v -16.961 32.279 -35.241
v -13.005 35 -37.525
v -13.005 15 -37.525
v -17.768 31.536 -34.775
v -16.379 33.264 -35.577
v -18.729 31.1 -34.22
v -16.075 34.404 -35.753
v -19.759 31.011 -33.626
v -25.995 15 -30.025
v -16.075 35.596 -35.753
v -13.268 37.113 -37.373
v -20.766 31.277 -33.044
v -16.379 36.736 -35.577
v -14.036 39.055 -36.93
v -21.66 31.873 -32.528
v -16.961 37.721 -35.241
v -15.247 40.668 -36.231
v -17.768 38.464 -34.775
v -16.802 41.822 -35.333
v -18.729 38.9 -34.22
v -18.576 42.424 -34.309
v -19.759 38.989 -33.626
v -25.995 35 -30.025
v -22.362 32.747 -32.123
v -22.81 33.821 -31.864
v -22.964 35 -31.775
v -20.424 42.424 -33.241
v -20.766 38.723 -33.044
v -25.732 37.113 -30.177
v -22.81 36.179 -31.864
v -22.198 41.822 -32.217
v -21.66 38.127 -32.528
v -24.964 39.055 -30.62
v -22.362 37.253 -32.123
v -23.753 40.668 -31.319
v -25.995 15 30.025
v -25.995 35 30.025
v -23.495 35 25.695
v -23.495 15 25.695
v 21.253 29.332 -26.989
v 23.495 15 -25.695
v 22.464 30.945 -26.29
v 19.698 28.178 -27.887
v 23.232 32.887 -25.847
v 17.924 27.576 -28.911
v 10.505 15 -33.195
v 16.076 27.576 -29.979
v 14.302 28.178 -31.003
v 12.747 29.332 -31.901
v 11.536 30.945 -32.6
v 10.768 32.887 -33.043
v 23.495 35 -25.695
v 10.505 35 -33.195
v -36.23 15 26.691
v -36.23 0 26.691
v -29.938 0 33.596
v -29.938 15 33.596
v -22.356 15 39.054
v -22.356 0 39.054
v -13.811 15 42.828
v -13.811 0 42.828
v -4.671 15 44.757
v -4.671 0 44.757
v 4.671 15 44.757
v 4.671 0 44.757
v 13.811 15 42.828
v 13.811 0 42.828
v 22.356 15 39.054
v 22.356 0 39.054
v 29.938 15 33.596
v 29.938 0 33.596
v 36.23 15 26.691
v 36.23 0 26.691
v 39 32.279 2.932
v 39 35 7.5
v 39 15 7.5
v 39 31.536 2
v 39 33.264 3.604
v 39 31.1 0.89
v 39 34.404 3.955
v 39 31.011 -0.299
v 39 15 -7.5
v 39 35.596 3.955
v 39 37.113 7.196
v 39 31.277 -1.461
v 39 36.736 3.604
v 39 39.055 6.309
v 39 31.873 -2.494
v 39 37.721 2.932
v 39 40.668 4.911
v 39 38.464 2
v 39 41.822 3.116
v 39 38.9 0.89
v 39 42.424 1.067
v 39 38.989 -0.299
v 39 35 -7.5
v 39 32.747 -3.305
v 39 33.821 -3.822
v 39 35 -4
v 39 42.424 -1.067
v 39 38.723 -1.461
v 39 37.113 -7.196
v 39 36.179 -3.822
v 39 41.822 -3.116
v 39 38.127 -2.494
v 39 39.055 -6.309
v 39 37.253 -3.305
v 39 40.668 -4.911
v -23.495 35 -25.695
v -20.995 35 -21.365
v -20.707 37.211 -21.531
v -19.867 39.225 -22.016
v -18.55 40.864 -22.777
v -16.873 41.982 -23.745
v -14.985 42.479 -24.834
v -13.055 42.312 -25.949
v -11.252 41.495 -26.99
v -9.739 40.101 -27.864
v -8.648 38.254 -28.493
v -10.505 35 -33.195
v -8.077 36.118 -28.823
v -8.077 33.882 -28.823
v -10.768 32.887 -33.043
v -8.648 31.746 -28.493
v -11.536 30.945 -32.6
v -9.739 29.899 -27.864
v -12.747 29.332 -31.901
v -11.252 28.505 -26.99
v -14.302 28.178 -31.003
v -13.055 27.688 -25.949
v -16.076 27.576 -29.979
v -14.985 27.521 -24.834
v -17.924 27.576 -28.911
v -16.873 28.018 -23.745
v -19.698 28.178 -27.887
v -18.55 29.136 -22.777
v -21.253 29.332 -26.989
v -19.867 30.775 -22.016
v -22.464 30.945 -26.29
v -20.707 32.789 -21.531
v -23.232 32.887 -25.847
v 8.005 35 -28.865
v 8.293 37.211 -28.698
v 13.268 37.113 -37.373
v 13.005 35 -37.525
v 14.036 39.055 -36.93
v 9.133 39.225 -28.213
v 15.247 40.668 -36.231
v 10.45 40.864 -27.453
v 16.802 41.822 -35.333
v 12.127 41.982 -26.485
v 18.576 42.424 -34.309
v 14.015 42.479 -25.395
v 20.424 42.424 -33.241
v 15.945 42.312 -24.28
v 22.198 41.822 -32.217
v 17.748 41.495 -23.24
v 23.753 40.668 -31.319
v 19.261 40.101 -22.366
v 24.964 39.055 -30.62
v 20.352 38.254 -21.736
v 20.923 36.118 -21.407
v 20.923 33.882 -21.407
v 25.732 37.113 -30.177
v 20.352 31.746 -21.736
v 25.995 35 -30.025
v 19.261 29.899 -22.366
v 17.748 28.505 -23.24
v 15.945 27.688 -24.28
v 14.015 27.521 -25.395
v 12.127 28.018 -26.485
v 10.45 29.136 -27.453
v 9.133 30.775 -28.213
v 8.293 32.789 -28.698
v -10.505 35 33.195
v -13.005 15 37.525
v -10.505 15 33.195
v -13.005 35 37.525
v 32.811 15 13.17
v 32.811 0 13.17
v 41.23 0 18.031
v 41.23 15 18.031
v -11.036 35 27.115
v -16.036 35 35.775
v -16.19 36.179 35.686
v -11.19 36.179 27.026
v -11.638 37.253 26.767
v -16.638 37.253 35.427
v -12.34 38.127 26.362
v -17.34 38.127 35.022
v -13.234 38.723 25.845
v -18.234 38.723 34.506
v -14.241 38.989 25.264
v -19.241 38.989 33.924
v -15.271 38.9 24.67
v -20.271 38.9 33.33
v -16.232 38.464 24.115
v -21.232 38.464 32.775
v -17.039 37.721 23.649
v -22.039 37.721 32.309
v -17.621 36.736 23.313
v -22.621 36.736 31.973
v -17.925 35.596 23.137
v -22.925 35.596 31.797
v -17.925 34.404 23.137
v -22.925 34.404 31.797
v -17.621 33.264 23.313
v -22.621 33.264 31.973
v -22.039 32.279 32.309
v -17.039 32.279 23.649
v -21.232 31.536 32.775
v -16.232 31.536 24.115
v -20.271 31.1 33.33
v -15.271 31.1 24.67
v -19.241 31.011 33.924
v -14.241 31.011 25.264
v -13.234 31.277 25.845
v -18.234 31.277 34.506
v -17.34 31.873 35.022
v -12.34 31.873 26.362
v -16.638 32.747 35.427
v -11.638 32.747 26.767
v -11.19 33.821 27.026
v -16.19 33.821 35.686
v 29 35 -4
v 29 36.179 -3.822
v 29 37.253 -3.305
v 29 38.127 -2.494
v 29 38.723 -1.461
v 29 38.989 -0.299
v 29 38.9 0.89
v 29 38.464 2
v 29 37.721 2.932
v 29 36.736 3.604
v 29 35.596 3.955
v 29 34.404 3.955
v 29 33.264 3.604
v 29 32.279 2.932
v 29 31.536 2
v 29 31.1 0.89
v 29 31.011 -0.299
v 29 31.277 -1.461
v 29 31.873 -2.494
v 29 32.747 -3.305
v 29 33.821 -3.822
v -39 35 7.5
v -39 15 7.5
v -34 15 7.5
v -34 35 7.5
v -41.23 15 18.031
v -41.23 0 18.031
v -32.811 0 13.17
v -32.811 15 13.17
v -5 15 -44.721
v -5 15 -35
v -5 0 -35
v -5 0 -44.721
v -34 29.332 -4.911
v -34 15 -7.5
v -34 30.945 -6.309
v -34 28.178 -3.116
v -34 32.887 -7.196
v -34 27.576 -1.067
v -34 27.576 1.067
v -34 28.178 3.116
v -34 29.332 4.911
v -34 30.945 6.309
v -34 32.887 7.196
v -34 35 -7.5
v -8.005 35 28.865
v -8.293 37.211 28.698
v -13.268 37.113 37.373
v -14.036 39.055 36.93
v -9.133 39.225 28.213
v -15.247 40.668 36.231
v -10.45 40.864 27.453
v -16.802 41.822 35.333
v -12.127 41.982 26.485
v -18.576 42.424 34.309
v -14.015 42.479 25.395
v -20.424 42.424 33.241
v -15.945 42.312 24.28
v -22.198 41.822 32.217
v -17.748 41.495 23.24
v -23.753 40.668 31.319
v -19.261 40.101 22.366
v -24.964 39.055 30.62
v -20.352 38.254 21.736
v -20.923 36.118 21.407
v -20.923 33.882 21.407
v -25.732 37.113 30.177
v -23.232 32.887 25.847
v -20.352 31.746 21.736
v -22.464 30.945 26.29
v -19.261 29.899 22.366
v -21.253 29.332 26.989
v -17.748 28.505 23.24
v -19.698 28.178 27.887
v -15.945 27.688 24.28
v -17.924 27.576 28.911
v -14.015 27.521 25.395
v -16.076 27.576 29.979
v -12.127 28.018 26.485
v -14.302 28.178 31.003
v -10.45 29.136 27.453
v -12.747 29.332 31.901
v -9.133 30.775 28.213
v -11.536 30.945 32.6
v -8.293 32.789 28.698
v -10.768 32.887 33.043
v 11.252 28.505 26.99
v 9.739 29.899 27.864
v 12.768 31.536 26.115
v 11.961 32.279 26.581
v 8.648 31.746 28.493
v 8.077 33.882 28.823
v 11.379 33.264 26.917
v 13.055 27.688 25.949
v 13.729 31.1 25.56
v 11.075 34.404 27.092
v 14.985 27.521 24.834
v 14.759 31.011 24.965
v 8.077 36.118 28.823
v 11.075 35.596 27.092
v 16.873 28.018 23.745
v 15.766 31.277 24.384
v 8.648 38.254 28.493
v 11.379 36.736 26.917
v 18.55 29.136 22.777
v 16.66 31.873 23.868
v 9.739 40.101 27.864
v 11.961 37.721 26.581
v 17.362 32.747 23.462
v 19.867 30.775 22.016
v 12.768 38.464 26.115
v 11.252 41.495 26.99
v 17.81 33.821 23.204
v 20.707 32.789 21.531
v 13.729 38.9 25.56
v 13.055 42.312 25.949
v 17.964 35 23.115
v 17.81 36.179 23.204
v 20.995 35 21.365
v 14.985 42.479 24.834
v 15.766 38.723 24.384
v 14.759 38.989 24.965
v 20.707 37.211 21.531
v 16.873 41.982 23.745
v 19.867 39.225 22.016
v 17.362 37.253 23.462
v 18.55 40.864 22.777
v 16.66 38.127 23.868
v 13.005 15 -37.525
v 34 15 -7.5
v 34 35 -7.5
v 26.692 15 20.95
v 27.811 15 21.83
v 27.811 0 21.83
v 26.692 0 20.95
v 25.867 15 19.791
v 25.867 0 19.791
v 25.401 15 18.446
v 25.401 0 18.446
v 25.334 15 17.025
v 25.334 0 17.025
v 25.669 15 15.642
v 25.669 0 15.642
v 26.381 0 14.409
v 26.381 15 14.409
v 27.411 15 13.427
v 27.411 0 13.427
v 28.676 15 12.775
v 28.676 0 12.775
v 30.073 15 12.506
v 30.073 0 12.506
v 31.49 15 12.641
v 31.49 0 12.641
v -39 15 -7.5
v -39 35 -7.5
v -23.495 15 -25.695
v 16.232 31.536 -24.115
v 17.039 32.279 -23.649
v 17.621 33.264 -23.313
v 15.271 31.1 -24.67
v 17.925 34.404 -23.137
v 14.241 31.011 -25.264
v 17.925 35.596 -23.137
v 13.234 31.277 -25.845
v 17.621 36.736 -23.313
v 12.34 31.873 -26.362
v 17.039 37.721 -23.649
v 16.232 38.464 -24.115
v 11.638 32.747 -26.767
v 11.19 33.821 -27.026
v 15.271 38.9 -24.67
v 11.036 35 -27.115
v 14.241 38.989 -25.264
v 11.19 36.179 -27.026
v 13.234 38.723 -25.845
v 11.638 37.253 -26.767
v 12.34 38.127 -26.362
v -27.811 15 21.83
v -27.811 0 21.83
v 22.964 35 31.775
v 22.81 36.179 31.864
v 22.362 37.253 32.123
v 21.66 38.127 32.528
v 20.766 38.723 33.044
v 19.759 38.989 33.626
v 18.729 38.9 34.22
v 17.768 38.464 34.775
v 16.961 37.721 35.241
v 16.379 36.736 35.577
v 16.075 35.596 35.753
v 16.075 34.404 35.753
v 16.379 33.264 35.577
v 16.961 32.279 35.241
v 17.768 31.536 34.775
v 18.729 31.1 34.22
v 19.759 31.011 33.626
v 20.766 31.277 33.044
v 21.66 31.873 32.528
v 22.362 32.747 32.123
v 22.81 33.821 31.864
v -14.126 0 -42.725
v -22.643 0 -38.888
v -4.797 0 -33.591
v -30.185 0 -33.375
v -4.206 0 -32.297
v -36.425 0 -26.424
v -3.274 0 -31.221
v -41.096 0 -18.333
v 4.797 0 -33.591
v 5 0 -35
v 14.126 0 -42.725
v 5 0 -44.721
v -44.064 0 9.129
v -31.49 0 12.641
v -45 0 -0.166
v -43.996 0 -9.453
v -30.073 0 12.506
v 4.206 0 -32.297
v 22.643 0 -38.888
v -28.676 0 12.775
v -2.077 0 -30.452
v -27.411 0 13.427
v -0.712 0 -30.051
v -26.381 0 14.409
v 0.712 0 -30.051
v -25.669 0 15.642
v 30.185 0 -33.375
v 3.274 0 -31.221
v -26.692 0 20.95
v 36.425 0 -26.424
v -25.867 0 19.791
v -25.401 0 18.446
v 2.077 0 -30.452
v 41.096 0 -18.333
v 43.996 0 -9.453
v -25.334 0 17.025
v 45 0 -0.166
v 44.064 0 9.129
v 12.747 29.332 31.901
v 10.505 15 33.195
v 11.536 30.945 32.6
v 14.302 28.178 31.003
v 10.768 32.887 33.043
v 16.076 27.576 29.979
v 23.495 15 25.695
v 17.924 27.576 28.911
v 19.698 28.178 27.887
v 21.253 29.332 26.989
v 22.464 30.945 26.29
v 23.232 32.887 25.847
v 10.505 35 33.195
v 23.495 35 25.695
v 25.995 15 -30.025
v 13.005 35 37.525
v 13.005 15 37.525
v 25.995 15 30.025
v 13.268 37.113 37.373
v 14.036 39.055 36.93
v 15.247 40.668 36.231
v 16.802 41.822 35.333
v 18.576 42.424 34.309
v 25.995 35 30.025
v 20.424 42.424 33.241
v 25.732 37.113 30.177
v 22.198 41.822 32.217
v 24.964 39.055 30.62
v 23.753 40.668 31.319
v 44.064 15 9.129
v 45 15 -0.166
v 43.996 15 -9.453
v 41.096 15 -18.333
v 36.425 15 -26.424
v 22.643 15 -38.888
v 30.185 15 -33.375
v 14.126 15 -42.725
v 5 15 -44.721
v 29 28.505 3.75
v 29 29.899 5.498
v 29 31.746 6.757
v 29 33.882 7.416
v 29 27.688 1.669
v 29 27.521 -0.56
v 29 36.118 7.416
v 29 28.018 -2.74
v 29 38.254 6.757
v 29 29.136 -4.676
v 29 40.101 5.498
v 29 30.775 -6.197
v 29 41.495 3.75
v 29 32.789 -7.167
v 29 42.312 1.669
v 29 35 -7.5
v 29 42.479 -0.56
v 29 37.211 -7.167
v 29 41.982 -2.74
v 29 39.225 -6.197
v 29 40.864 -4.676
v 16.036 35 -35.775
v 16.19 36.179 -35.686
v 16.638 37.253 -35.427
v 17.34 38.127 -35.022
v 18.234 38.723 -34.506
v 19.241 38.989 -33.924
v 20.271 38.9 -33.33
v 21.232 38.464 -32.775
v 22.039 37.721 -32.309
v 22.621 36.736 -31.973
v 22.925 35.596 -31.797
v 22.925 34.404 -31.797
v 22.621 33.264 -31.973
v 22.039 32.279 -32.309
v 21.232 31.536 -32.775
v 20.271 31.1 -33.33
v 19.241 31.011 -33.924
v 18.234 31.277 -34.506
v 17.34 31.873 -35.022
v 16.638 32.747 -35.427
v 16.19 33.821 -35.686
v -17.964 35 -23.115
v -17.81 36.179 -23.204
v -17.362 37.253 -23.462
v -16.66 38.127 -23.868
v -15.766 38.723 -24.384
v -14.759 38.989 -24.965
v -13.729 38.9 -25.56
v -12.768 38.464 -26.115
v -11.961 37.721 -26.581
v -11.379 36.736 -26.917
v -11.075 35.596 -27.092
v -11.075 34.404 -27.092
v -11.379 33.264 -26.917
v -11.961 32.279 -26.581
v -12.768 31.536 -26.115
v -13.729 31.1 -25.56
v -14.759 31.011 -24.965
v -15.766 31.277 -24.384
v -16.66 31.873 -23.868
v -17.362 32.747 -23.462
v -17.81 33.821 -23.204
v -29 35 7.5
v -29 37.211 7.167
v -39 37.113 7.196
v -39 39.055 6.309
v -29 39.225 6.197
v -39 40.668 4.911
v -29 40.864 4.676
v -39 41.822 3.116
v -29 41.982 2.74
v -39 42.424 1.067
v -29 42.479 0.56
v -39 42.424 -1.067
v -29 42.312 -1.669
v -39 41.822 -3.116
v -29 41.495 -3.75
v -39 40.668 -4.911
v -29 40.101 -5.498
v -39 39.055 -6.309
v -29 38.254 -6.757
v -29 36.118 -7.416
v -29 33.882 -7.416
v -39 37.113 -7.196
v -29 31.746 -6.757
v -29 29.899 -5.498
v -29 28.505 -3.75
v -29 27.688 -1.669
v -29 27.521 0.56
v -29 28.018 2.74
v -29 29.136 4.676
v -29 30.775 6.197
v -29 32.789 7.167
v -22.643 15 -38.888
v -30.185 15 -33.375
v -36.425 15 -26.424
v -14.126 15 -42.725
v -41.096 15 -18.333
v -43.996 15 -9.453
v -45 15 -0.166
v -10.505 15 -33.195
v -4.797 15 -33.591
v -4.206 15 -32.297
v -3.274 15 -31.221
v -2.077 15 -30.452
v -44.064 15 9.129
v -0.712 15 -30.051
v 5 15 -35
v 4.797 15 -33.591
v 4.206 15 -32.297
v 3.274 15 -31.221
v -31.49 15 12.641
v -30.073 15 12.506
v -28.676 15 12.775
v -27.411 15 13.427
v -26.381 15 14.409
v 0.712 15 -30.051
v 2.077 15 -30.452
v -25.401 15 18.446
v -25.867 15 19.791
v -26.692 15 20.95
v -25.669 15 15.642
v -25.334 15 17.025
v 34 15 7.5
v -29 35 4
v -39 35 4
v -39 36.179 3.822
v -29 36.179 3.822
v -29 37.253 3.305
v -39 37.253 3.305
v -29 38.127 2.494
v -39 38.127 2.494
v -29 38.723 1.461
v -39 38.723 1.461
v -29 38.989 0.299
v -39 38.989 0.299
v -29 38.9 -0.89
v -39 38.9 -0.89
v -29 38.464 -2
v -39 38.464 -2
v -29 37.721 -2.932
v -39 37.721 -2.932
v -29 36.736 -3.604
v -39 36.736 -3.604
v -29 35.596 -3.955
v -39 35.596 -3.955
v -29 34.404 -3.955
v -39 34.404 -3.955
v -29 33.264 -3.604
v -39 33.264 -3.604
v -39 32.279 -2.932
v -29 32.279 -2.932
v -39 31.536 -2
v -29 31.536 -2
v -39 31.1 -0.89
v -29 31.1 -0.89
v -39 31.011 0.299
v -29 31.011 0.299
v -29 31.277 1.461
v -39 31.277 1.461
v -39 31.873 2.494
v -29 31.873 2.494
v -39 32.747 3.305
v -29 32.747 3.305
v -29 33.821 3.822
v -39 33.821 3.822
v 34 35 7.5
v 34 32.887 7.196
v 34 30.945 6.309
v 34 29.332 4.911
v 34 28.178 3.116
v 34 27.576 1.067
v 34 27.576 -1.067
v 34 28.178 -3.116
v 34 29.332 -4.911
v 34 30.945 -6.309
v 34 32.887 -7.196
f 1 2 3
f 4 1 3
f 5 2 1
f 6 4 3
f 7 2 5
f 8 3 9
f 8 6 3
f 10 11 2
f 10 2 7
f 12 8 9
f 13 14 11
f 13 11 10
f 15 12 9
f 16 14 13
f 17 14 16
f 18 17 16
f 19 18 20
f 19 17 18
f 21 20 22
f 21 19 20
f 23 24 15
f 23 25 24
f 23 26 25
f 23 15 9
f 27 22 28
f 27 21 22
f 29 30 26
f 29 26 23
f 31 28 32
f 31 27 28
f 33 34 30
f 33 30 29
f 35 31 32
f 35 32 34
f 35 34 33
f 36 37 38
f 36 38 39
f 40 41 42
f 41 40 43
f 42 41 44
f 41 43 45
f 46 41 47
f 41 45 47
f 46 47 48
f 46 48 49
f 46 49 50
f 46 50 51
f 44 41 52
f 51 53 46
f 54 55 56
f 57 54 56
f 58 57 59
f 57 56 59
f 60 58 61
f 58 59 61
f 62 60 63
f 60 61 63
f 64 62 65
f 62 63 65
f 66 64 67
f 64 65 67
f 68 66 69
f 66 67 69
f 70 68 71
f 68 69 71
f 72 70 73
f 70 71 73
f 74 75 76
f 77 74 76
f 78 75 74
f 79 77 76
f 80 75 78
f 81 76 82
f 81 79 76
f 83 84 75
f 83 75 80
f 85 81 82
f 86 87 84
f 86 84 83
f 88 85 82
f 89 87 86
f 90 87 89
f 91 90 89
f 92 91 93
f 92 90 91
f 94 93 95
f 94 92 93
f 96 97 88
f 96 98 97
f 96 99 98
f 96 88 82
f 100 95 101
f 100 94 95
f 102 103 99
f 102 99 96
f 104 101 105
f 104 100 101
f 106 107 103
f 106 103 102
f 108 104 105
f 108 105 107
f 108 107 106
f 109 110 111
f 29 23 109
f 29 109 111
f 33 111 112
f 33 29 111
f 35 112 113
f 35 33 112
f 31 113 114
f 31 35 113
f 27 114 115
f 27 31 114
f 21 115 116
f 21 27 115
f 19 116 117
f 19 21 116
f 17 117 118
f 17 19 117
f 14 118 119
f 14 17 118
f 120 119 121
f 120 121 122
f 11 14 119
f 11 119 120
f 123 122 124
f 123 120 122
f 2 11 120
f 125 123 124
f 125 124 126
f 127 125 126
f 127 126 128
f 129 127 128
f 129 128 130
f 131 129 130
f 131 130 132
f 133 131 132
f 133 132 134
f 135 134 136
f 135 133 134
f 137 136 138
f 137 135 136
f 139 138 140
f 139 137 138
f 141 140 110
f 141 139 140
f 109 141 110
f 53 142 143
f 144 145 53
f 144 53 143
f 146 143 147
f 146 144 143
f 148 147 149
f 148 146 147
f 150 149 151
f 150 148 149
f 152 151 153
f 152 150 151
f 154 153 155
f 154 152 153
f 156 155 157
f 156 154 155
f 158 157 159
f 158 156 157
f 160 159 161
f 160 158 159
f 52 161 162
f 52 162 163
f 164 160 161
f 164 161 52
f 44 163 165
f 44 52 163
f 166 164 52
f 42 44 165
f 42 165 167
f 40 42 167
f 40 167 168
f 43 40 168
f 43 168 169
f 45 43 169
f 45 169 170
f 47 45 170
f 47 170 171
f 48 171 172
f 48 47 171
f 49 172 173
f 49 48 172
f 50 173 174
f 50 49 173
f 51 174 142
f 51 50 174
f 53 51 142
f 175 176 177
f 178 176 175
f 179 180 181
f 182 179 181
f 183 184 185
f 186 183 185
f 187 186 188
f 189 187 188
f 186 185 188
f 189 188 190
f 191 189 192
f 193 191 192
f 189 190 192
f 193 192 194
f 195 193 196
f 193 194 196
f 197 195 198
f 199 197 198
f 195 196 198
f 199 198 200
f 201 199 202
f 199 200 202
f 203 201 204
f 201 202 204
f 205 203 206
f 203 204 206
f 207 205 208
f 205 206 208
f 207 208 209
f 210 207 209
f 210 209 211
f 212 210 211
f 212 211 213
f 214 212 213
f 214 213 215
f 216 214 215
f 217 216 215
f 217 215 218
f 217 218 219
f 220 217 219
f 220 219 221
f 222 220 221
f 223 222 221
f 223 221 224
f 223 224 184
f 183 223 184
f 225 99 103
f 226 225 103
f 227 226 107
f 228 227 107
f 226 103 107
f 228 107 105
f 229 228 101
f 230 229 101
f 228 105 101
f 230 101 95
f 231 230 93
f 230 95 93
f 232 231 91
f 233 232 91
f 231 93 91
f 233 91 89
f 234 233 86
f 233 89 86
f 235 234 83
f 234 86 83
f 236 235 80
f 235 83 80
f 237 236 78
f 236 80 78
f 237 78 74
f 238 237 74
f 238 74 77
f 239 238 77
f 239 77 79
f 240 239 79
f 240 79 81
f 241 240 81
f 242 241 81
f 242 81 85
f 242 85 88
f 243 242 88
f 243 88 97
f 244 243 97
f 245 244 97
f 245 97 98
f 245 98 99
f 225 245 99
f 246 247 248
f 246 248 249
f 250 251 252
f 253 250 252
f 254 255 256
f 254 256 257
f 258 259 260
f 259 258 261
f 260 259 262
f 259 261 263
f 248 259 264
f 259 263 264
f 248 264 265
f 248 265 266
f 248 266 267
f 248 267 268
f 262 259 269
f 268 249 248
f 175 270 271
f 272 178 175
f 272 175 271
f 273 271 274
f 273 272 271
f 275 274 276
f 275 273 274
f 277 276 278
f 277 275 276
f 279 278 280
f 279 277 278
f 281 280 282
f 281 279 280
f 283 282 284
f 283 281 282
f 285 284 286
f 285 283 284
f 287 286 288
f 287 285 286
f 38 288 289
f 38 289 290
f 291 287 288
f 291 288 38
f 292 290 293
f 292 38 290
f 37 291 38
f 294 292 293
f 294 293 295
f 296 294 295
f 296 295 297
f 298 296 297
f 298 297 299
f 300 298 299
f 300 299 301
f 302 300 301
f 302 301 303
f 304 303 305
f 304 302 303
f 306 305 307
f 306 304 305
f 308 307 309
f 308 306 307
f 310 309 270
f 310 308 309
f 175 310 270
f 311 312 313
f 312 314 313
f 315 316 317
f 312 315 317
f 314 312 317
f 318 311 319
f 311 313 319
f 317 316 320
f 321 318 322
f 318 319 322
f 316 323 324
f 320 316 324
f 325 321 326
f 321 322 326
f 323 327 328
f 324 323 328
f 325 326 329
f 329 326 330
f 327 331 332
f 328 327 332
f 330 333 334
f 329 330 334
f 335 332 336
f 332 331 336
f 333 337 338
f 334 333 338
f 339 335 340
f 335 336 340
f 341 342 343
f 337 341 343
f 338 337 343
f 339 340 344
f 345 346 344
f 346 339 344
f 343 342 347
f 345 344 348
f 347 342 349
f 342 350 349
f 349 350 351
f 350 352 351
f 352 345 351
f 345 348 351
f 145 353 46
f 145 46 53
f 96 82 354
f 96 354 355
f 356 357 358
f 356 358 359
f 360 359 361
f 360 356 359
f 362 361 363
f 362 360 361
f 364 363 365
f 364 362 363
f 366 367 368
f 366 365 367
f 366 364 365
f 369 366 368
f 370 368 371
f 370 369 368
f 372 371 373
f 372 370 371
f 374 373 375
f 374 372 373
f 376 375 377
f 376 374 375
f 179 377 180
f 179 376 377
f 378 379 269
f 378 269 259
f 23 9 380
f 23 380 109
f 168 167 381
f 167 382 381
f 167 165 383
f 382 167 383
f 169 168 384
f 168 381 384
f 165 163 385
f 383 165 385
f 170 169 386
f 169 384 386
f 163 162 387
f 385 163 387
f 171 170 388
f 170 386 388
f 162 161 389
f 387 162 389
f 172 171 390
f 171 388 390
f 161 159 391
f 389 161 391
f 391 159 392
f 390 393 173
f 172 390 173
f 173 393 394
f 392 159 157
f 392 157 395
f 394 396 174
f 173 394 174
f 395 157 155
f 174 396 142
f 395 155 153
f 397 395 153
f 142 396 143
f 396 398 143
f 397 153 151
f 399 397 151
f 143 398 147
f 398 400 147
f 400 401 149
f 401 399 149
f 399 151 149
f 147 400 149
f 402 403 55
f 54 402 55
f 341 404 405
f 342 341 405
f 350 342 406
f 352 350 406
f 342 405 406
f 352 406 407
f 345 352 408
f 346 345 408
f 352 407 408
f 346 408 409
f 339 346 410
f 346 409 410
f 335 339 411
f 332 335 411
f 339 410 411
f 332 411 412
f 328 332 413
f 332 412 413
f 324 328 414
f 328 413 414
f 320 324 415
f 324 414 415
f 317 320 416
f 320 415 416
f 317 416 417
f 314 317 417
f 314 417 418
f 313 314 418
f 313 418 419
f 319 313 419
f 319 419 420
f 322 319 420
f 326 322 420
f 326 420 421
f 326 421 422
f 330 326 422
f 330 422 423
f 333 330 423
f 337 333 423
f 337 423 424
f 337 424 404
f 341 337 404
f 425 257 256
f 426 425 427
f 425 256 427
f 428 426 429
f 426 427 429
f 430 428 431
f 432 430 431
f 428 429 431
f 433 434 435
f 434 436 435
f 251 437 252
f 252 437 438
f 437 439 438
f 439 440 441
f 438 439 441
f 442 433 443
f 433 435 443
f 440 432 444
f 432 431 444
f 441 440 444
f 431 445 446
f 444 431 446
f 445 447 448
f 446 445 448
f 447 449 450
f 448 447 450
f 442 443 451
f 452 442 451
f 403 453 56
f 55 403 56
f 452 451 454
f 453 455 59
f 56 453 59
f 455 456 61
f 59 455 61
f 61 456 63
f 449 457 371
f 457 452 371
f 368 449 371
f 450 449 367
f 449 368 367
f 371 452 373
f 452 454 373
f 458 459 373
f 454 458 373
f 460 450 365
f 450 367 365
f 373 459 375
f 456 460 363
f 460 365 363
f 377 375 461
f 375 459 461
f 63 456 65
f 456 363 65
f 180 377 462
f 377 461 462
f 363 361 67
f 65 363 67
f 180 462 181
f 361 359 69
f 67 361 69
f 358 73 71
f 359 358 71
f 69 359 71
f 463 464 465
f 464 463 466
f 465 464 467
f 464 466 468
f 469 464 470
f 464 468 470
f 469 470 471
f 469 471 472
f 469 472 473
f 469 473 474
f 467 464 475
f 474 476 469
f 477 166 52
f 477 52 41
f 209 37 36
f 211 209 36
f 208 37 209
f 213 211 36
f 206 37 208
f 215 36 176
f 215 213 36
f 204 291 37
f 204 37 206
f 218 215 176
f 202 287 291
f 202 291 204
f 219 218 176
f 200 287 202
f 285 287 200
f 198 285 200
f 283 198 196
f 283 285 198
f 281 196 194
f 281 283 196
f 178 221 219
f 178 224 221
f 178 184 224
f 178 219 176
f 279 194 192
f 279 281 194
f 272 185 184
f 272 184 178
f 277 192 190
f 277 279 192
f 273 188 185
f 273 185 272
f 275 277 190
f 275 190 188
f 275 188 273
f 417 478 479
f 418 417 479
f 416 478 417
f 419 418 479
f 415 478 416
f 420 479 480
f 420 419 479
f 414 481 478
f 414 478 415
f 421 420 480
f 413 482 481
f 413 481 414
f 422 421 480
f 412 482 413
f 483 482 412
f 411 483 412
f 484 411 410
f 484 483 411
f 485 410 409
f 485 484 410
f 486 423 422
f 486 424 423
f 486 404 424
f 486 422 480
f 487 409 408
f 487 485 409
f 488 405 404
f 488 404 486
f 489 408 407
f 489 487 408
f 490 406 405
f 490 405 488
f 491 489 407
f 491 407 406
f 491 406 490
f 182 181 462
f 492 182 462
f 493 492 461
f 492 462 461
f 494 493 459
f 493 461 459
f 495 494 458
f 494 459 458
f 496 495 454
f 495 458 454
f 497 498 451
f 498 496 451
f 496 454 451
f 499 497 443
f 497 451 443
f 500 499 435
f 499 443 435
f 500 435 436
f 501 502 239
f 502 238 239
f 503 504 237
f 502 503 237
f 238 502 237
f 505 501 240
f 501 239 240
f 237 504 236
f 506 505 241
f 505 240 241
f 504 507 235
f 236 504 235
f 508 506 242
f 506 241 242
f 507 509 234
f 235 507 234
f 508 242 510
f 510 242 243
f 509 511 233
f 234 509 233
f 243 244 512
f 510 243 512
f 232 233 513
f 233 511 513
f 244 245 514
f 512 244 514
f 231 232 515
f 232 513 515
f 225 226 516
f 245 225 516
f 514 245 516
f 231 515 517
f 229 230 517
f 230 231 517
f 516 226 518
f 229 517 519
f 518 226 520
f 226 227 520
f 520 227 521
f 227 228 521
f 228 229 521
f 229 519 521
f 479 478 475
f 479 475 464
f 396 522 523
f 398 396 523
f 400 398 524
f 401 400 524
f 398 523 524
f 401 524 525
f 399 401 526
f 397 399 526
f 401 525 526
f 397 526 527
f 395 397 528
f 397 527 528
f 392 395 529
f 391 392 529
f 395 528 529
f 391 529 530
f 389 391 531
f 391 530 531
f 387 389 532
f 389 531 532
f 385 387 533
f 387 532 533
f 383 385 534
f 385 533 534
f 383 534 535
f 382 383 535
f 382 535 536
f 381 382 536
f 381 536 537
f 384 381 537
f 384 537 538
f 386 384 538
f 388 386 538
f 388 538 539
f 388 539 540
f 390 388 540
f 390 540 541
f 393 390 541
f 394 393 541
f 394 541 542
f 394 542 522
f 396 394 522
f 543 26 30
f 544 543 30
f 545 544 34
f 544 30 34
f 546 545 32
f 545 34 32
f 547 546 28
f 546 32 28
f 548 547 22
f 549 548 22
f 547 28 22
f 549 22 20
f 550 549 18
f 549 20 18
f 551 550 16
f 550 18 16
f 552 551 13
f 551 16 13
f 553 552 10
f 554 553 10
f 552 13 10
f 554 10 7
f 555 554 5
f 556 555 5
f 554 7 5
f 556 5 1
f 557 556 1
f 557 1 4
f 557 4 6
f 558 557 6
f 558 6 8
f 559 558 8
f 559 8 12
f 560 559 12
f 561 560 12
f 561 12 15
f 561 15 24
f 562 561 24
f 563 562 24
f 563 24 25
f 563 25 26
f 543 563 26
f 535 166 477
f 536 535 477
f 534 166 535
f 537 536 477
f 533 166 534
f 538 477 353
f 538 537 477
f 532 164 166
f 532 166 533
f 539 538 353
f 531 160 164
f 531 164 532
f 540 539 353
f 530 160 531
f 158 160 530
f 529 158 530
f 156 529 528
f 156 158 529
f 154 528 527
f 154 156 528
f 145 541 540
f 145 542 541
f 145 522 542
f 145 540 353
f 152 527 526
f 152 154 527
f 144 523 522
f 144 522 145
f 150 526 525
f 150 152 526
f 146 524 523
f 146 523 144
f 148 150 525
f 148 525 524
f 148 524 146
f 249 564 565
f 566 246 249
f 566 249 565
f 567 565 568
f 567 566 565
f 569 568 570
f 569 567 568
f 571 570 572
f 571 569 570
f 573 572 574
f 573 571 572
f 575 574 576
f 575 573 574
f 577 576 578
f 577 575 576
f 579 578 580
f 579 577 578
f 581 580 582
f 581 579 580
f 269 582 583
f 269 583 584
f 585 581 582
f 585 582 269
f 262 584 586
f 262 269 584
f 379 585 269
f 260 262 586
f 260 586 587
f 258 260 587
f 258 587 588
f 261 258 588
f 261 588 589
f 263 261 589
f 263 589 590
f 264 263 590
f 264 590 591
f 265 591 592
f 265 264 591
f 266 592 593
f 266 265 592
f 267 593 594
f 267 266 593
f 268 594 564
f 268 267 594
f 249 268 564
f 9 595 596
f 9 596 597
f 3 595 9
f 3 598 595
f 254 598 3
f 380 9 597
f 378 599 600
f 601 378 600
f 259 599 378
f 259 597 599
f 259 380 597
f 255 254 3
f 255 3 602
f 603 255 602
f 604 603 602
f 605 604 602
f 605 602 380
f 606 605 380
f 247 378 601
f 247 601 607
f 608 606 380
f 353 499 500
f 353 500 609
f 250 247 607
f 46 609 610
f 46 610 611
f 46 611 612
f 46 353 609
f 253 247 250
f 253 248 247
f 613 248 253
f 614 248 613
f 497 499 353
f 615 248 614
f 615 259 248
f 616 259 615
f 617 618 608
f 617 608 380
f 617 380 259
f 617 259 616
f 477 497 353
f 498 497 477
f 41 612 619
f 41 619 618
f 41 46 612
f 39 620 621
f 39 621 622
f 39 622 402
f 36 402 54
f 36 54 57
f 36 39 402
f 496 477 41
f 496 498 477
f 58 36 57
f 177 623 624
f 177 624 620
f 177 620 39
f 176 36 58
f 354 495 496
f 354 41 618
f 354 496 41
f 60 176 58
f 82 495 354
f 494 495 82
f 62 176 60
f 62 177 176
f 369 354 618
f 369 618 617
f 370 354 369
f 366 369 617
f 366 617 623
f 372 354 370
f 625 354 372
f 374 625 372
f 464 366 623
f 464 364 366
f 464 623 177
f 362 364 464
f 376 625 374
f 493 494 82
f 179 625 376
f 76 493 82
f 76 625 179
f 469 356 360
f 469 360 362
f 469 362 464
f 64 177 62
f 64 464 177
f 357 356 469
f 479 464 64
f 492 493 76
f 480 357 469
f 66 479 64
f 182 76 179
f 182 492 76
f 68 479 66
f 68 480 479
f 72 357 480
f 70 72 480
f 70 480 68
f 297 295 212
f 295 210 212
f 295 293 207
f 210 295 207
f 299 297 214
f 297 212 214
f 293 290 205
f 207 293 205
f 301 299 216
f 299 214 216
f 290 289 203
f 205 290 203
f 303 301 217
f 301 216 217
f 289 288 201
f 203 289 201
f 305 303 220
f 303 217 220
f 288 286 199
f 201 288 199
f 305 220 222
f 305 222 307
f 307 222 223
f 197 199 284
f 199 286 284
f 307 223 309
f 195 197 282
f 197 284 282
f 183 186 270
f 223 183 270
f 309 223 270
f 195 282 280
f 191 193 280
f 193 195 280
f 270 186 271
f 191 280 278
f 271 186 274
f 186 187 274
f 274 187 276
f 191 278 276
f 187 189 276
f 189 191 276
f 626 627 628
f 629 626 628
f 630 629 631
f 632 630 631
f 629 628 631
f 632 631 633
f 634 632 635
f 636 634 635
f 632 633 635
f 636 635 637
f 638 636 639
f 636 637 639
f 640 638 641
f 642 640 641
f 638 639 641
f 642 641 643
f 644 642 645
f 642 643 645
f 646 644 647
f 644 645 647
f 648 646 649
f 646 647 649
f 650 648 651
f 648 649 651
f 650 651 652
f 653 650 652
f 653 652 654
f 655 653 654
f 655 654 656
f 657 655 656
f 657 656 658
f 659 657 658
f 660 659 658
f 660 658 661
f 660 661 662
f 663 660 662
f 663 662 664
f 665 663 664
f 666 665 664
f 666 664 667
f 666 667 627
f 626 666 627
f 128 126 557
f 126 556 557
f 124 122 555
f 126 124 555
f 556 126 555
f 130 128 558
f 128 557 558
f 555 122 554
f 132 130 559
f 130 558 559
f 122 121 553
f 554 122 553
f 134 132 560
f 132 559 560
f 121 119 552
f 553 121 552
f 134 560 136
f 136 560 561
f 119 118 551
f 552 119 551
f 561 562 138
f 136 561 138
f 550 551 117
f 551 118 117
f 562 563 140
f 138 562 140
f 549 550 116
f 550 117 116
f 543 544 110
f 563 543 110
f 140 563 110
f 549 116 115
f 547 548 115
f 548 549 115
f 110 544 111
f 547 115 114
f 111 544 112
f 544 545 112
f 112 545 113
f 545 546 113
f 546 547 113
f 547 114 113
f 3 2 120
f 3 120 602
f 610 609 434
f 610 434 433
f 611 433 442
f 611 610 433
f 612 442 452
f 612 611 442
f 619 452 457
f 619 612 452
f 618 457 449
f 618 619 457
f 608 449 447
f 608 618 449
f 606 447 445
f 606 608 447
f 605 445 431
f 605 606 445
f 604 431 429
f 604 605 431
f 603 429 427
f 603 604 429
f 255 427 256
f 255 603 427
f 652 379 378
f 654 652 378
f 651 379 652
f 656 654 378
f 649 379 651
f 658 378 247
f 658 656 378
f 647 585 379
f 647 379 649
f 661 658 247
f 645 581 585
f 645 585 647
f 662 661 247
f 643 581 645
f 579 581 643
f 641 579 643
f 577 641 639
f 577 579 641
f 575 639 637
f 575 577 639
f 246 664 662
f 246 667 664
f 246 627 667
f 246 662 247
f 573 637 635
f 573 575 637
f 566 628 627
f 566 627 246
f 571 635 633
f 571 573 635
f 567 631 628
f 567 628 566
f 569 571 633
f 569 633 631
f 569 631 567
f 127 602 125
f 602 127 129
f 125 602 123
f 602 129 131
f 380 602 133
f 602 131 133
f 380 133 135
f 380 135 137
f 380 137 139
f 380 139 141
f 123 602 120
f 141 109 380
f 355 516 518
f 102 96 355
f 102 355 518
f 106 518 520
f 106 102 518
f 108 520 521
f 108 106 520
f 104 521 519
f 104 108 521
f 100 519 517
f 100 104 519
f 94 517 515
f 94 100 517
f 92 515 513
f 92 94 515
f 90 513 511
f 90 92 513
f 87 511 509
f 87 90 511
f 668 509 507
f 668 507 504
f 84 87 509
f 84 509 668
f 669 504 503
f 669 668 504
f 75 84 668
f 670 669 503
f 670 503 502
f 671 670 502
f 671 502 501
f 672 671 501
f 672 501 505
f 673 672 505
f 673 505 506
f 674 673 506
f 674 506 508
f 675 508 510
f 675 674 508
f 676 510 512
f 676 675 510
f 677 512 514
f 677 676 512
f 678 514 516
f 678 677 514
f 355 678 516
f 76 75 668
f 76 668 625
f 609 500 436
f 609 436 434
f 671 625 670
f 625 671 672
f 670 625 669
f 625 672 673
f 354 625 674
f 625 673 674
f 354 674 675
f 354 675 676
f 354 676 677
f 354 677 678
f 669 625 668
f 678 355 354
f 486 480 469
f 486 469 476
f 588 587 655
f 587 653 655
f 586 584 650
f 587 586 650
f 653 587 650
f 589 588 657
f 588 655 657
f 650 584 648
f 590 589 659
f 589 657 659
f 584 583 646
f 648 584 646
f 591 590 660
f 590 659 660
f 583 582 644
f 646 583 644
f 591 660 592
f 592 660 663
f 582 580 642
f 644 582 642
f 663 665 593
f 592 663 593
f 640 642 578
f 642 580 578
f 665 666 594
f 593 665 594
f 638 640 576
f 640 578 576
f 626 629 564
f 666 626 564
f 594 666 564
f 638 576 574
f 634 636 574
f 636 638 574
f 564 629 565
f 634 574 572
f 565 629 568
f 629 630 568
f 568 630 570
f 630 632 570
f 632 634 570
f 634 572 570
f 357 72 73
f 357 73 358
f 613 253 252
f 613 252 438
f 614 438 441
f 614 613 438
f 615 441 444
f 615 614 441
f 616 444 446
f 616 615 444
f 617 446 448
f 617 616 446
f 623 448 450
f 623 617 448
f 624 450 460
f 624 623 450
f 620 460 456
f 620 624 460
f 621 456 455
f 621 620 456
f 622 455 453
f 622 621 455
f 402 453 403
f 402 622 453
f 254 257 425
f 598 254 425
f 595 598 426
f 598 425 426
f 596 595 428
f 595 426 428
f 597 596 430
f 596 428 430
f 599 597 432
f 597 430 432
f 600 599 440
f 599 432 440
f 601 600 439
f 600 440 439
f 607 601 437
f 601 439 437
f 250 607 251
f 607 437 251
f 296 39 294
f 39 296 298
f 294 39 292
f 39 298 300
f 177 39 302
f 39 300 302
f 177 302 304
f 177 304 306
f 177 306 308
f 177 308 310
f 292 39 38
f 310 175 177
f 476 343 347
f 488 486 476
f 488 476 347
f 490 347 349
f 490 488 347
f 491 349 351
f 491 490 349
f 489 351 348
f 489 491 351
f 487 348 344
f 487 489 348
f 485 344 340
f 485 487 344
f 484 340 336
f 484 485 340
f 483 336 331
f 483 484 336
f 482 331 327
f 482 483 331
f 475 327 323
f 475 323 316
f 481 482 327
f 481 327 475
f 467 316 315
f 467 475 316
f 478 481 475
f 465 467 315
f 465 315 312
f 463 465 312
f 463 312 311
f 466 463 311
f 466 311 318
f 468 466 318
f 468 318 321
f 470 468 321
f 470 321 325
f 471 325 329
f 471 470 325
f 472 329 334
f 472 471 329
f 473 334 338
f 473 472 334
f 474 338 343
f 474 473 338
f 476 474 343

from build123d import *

# Parameters (mm, degrees)
SKETCH1_R           = 45
BOSS_EXTRUDE1_DEPTH = 15
CUT_EXTRUDE1_DEPTH  = 66.383484153
CIRPATTERN1_COUNT   = 3
SKETCH4_R           = 4
BOSS_EXTRUDE2_DEPTH = 5
SKETCH6_R           = 7.5
SKETCH6_R_2         = 4
BOSS_EXTRUDE3_DEPTH = 10
CIRPATTERN2_COUNT   = 6


with BuildPart() as part:
    # Sketch1 → Boss-Extrude1 (new body)
    with BuildSketch(Plane(origin=(0, 0, 0), x_dir=(1, 0, 0), z_dir=(0, 1, 0))):
        with Locations(Location((0, 0, 0), (0, 0, 270))):
            Circle(SKETCH1_R)
    extrude(amount=BOSS_EXTRUDE1_DEPTH)

    # Sketch2 → Cut-Extrude1 (cut, through all)
    with BuildSketch(Plane(origin=(0, 15, 0), x_dir=(1, 0, 0), z_dir=(0, 1, 0))):
        with BuildLine():
            Line((-5, 35), (-5, 44.72135955))
            ThreePointArc((-5, 44.72135955), (0, 45), (5, 44.72135955))
            Line((5, 44.72135955), (5, 35))
            ThreePointArc((5, 35), (0, 30), (-5, 35))
        make_face()
    cut_extrude1 = extrude(amount=-CUT_EXTRUDE1_DEPTH, mode=Mode.SUBTRACT)

    # CirPattern1: Cut-Extrude1 ×3 about axis
    cirpattern1_axis = Axis((0, 0, 0), (0, 1, 0))
    for i in range(1, CIRPATTERN1_COUNT):
        add(cut_extrude1.rotate(cirpattern1_axis, i * 360 / CIRPATTERN1_COUNT), mode=Mode.SUBTRACT)

    # Sketch4 → Boss-Extrude2 (add)
    with BuildSketch(Plane(origin=(39, 0, 0), x_dir=(0, 0, -1), z_dir=(1, 0, 0))):
        with BuildLine():
            Line((-7.5, 35), (-7.5, 15))
            Line((-7.5, 15), (7.5, 15))
            Line((7.5, 15), (7.5, 35))
            ThreePointArc((7.5, 35), (0, 42.5), (-7.5, 35))
        make_face()
        with Locations((0, 35)):
            Circle(SKETCH4_R, mode=Mode.SUBTRACT)
    boss_extrude2 = extrude(amount=-BOSS_EXTRUDE2_DEPTH)

    # Sketch6 → Boss-Extrude3 (add)
    with BuildSketch(Plane(origin=(39, 0, 0), x_dir=(0, 0, -1), z_dir=(1, 0, 0))):
        with Locations((0, 35)):
            Circle(SKETCH6_R)
        with Locations((0, 35)):
            Circle(SKETCH6_R_2, mode=Mode.SUBTRACT)
    boss_extrude3 = extrude(amount=-BOSS_EXTRUDE3_DEPTH)

    # CirPattern2: Boss-Extrude2, Boss-Extrude3 ×6 about axis
    cirpattern2_axis = Axis((0, 0, 0), (0, 1, 0))
    add([boss_extrude2.rotate(cirpattern2_axis, i * 360 / CIRPATTERN2_COUNT) for i in range(1, CIRPATTERN2_COUNT)])
    add([boss_extrude3.rotate(cirpattern2_axis, i * 360 / CIRPATTERN2_COUNT) for i in range(1, CIRPATTERN2_COUNT)])


solid = part.part
